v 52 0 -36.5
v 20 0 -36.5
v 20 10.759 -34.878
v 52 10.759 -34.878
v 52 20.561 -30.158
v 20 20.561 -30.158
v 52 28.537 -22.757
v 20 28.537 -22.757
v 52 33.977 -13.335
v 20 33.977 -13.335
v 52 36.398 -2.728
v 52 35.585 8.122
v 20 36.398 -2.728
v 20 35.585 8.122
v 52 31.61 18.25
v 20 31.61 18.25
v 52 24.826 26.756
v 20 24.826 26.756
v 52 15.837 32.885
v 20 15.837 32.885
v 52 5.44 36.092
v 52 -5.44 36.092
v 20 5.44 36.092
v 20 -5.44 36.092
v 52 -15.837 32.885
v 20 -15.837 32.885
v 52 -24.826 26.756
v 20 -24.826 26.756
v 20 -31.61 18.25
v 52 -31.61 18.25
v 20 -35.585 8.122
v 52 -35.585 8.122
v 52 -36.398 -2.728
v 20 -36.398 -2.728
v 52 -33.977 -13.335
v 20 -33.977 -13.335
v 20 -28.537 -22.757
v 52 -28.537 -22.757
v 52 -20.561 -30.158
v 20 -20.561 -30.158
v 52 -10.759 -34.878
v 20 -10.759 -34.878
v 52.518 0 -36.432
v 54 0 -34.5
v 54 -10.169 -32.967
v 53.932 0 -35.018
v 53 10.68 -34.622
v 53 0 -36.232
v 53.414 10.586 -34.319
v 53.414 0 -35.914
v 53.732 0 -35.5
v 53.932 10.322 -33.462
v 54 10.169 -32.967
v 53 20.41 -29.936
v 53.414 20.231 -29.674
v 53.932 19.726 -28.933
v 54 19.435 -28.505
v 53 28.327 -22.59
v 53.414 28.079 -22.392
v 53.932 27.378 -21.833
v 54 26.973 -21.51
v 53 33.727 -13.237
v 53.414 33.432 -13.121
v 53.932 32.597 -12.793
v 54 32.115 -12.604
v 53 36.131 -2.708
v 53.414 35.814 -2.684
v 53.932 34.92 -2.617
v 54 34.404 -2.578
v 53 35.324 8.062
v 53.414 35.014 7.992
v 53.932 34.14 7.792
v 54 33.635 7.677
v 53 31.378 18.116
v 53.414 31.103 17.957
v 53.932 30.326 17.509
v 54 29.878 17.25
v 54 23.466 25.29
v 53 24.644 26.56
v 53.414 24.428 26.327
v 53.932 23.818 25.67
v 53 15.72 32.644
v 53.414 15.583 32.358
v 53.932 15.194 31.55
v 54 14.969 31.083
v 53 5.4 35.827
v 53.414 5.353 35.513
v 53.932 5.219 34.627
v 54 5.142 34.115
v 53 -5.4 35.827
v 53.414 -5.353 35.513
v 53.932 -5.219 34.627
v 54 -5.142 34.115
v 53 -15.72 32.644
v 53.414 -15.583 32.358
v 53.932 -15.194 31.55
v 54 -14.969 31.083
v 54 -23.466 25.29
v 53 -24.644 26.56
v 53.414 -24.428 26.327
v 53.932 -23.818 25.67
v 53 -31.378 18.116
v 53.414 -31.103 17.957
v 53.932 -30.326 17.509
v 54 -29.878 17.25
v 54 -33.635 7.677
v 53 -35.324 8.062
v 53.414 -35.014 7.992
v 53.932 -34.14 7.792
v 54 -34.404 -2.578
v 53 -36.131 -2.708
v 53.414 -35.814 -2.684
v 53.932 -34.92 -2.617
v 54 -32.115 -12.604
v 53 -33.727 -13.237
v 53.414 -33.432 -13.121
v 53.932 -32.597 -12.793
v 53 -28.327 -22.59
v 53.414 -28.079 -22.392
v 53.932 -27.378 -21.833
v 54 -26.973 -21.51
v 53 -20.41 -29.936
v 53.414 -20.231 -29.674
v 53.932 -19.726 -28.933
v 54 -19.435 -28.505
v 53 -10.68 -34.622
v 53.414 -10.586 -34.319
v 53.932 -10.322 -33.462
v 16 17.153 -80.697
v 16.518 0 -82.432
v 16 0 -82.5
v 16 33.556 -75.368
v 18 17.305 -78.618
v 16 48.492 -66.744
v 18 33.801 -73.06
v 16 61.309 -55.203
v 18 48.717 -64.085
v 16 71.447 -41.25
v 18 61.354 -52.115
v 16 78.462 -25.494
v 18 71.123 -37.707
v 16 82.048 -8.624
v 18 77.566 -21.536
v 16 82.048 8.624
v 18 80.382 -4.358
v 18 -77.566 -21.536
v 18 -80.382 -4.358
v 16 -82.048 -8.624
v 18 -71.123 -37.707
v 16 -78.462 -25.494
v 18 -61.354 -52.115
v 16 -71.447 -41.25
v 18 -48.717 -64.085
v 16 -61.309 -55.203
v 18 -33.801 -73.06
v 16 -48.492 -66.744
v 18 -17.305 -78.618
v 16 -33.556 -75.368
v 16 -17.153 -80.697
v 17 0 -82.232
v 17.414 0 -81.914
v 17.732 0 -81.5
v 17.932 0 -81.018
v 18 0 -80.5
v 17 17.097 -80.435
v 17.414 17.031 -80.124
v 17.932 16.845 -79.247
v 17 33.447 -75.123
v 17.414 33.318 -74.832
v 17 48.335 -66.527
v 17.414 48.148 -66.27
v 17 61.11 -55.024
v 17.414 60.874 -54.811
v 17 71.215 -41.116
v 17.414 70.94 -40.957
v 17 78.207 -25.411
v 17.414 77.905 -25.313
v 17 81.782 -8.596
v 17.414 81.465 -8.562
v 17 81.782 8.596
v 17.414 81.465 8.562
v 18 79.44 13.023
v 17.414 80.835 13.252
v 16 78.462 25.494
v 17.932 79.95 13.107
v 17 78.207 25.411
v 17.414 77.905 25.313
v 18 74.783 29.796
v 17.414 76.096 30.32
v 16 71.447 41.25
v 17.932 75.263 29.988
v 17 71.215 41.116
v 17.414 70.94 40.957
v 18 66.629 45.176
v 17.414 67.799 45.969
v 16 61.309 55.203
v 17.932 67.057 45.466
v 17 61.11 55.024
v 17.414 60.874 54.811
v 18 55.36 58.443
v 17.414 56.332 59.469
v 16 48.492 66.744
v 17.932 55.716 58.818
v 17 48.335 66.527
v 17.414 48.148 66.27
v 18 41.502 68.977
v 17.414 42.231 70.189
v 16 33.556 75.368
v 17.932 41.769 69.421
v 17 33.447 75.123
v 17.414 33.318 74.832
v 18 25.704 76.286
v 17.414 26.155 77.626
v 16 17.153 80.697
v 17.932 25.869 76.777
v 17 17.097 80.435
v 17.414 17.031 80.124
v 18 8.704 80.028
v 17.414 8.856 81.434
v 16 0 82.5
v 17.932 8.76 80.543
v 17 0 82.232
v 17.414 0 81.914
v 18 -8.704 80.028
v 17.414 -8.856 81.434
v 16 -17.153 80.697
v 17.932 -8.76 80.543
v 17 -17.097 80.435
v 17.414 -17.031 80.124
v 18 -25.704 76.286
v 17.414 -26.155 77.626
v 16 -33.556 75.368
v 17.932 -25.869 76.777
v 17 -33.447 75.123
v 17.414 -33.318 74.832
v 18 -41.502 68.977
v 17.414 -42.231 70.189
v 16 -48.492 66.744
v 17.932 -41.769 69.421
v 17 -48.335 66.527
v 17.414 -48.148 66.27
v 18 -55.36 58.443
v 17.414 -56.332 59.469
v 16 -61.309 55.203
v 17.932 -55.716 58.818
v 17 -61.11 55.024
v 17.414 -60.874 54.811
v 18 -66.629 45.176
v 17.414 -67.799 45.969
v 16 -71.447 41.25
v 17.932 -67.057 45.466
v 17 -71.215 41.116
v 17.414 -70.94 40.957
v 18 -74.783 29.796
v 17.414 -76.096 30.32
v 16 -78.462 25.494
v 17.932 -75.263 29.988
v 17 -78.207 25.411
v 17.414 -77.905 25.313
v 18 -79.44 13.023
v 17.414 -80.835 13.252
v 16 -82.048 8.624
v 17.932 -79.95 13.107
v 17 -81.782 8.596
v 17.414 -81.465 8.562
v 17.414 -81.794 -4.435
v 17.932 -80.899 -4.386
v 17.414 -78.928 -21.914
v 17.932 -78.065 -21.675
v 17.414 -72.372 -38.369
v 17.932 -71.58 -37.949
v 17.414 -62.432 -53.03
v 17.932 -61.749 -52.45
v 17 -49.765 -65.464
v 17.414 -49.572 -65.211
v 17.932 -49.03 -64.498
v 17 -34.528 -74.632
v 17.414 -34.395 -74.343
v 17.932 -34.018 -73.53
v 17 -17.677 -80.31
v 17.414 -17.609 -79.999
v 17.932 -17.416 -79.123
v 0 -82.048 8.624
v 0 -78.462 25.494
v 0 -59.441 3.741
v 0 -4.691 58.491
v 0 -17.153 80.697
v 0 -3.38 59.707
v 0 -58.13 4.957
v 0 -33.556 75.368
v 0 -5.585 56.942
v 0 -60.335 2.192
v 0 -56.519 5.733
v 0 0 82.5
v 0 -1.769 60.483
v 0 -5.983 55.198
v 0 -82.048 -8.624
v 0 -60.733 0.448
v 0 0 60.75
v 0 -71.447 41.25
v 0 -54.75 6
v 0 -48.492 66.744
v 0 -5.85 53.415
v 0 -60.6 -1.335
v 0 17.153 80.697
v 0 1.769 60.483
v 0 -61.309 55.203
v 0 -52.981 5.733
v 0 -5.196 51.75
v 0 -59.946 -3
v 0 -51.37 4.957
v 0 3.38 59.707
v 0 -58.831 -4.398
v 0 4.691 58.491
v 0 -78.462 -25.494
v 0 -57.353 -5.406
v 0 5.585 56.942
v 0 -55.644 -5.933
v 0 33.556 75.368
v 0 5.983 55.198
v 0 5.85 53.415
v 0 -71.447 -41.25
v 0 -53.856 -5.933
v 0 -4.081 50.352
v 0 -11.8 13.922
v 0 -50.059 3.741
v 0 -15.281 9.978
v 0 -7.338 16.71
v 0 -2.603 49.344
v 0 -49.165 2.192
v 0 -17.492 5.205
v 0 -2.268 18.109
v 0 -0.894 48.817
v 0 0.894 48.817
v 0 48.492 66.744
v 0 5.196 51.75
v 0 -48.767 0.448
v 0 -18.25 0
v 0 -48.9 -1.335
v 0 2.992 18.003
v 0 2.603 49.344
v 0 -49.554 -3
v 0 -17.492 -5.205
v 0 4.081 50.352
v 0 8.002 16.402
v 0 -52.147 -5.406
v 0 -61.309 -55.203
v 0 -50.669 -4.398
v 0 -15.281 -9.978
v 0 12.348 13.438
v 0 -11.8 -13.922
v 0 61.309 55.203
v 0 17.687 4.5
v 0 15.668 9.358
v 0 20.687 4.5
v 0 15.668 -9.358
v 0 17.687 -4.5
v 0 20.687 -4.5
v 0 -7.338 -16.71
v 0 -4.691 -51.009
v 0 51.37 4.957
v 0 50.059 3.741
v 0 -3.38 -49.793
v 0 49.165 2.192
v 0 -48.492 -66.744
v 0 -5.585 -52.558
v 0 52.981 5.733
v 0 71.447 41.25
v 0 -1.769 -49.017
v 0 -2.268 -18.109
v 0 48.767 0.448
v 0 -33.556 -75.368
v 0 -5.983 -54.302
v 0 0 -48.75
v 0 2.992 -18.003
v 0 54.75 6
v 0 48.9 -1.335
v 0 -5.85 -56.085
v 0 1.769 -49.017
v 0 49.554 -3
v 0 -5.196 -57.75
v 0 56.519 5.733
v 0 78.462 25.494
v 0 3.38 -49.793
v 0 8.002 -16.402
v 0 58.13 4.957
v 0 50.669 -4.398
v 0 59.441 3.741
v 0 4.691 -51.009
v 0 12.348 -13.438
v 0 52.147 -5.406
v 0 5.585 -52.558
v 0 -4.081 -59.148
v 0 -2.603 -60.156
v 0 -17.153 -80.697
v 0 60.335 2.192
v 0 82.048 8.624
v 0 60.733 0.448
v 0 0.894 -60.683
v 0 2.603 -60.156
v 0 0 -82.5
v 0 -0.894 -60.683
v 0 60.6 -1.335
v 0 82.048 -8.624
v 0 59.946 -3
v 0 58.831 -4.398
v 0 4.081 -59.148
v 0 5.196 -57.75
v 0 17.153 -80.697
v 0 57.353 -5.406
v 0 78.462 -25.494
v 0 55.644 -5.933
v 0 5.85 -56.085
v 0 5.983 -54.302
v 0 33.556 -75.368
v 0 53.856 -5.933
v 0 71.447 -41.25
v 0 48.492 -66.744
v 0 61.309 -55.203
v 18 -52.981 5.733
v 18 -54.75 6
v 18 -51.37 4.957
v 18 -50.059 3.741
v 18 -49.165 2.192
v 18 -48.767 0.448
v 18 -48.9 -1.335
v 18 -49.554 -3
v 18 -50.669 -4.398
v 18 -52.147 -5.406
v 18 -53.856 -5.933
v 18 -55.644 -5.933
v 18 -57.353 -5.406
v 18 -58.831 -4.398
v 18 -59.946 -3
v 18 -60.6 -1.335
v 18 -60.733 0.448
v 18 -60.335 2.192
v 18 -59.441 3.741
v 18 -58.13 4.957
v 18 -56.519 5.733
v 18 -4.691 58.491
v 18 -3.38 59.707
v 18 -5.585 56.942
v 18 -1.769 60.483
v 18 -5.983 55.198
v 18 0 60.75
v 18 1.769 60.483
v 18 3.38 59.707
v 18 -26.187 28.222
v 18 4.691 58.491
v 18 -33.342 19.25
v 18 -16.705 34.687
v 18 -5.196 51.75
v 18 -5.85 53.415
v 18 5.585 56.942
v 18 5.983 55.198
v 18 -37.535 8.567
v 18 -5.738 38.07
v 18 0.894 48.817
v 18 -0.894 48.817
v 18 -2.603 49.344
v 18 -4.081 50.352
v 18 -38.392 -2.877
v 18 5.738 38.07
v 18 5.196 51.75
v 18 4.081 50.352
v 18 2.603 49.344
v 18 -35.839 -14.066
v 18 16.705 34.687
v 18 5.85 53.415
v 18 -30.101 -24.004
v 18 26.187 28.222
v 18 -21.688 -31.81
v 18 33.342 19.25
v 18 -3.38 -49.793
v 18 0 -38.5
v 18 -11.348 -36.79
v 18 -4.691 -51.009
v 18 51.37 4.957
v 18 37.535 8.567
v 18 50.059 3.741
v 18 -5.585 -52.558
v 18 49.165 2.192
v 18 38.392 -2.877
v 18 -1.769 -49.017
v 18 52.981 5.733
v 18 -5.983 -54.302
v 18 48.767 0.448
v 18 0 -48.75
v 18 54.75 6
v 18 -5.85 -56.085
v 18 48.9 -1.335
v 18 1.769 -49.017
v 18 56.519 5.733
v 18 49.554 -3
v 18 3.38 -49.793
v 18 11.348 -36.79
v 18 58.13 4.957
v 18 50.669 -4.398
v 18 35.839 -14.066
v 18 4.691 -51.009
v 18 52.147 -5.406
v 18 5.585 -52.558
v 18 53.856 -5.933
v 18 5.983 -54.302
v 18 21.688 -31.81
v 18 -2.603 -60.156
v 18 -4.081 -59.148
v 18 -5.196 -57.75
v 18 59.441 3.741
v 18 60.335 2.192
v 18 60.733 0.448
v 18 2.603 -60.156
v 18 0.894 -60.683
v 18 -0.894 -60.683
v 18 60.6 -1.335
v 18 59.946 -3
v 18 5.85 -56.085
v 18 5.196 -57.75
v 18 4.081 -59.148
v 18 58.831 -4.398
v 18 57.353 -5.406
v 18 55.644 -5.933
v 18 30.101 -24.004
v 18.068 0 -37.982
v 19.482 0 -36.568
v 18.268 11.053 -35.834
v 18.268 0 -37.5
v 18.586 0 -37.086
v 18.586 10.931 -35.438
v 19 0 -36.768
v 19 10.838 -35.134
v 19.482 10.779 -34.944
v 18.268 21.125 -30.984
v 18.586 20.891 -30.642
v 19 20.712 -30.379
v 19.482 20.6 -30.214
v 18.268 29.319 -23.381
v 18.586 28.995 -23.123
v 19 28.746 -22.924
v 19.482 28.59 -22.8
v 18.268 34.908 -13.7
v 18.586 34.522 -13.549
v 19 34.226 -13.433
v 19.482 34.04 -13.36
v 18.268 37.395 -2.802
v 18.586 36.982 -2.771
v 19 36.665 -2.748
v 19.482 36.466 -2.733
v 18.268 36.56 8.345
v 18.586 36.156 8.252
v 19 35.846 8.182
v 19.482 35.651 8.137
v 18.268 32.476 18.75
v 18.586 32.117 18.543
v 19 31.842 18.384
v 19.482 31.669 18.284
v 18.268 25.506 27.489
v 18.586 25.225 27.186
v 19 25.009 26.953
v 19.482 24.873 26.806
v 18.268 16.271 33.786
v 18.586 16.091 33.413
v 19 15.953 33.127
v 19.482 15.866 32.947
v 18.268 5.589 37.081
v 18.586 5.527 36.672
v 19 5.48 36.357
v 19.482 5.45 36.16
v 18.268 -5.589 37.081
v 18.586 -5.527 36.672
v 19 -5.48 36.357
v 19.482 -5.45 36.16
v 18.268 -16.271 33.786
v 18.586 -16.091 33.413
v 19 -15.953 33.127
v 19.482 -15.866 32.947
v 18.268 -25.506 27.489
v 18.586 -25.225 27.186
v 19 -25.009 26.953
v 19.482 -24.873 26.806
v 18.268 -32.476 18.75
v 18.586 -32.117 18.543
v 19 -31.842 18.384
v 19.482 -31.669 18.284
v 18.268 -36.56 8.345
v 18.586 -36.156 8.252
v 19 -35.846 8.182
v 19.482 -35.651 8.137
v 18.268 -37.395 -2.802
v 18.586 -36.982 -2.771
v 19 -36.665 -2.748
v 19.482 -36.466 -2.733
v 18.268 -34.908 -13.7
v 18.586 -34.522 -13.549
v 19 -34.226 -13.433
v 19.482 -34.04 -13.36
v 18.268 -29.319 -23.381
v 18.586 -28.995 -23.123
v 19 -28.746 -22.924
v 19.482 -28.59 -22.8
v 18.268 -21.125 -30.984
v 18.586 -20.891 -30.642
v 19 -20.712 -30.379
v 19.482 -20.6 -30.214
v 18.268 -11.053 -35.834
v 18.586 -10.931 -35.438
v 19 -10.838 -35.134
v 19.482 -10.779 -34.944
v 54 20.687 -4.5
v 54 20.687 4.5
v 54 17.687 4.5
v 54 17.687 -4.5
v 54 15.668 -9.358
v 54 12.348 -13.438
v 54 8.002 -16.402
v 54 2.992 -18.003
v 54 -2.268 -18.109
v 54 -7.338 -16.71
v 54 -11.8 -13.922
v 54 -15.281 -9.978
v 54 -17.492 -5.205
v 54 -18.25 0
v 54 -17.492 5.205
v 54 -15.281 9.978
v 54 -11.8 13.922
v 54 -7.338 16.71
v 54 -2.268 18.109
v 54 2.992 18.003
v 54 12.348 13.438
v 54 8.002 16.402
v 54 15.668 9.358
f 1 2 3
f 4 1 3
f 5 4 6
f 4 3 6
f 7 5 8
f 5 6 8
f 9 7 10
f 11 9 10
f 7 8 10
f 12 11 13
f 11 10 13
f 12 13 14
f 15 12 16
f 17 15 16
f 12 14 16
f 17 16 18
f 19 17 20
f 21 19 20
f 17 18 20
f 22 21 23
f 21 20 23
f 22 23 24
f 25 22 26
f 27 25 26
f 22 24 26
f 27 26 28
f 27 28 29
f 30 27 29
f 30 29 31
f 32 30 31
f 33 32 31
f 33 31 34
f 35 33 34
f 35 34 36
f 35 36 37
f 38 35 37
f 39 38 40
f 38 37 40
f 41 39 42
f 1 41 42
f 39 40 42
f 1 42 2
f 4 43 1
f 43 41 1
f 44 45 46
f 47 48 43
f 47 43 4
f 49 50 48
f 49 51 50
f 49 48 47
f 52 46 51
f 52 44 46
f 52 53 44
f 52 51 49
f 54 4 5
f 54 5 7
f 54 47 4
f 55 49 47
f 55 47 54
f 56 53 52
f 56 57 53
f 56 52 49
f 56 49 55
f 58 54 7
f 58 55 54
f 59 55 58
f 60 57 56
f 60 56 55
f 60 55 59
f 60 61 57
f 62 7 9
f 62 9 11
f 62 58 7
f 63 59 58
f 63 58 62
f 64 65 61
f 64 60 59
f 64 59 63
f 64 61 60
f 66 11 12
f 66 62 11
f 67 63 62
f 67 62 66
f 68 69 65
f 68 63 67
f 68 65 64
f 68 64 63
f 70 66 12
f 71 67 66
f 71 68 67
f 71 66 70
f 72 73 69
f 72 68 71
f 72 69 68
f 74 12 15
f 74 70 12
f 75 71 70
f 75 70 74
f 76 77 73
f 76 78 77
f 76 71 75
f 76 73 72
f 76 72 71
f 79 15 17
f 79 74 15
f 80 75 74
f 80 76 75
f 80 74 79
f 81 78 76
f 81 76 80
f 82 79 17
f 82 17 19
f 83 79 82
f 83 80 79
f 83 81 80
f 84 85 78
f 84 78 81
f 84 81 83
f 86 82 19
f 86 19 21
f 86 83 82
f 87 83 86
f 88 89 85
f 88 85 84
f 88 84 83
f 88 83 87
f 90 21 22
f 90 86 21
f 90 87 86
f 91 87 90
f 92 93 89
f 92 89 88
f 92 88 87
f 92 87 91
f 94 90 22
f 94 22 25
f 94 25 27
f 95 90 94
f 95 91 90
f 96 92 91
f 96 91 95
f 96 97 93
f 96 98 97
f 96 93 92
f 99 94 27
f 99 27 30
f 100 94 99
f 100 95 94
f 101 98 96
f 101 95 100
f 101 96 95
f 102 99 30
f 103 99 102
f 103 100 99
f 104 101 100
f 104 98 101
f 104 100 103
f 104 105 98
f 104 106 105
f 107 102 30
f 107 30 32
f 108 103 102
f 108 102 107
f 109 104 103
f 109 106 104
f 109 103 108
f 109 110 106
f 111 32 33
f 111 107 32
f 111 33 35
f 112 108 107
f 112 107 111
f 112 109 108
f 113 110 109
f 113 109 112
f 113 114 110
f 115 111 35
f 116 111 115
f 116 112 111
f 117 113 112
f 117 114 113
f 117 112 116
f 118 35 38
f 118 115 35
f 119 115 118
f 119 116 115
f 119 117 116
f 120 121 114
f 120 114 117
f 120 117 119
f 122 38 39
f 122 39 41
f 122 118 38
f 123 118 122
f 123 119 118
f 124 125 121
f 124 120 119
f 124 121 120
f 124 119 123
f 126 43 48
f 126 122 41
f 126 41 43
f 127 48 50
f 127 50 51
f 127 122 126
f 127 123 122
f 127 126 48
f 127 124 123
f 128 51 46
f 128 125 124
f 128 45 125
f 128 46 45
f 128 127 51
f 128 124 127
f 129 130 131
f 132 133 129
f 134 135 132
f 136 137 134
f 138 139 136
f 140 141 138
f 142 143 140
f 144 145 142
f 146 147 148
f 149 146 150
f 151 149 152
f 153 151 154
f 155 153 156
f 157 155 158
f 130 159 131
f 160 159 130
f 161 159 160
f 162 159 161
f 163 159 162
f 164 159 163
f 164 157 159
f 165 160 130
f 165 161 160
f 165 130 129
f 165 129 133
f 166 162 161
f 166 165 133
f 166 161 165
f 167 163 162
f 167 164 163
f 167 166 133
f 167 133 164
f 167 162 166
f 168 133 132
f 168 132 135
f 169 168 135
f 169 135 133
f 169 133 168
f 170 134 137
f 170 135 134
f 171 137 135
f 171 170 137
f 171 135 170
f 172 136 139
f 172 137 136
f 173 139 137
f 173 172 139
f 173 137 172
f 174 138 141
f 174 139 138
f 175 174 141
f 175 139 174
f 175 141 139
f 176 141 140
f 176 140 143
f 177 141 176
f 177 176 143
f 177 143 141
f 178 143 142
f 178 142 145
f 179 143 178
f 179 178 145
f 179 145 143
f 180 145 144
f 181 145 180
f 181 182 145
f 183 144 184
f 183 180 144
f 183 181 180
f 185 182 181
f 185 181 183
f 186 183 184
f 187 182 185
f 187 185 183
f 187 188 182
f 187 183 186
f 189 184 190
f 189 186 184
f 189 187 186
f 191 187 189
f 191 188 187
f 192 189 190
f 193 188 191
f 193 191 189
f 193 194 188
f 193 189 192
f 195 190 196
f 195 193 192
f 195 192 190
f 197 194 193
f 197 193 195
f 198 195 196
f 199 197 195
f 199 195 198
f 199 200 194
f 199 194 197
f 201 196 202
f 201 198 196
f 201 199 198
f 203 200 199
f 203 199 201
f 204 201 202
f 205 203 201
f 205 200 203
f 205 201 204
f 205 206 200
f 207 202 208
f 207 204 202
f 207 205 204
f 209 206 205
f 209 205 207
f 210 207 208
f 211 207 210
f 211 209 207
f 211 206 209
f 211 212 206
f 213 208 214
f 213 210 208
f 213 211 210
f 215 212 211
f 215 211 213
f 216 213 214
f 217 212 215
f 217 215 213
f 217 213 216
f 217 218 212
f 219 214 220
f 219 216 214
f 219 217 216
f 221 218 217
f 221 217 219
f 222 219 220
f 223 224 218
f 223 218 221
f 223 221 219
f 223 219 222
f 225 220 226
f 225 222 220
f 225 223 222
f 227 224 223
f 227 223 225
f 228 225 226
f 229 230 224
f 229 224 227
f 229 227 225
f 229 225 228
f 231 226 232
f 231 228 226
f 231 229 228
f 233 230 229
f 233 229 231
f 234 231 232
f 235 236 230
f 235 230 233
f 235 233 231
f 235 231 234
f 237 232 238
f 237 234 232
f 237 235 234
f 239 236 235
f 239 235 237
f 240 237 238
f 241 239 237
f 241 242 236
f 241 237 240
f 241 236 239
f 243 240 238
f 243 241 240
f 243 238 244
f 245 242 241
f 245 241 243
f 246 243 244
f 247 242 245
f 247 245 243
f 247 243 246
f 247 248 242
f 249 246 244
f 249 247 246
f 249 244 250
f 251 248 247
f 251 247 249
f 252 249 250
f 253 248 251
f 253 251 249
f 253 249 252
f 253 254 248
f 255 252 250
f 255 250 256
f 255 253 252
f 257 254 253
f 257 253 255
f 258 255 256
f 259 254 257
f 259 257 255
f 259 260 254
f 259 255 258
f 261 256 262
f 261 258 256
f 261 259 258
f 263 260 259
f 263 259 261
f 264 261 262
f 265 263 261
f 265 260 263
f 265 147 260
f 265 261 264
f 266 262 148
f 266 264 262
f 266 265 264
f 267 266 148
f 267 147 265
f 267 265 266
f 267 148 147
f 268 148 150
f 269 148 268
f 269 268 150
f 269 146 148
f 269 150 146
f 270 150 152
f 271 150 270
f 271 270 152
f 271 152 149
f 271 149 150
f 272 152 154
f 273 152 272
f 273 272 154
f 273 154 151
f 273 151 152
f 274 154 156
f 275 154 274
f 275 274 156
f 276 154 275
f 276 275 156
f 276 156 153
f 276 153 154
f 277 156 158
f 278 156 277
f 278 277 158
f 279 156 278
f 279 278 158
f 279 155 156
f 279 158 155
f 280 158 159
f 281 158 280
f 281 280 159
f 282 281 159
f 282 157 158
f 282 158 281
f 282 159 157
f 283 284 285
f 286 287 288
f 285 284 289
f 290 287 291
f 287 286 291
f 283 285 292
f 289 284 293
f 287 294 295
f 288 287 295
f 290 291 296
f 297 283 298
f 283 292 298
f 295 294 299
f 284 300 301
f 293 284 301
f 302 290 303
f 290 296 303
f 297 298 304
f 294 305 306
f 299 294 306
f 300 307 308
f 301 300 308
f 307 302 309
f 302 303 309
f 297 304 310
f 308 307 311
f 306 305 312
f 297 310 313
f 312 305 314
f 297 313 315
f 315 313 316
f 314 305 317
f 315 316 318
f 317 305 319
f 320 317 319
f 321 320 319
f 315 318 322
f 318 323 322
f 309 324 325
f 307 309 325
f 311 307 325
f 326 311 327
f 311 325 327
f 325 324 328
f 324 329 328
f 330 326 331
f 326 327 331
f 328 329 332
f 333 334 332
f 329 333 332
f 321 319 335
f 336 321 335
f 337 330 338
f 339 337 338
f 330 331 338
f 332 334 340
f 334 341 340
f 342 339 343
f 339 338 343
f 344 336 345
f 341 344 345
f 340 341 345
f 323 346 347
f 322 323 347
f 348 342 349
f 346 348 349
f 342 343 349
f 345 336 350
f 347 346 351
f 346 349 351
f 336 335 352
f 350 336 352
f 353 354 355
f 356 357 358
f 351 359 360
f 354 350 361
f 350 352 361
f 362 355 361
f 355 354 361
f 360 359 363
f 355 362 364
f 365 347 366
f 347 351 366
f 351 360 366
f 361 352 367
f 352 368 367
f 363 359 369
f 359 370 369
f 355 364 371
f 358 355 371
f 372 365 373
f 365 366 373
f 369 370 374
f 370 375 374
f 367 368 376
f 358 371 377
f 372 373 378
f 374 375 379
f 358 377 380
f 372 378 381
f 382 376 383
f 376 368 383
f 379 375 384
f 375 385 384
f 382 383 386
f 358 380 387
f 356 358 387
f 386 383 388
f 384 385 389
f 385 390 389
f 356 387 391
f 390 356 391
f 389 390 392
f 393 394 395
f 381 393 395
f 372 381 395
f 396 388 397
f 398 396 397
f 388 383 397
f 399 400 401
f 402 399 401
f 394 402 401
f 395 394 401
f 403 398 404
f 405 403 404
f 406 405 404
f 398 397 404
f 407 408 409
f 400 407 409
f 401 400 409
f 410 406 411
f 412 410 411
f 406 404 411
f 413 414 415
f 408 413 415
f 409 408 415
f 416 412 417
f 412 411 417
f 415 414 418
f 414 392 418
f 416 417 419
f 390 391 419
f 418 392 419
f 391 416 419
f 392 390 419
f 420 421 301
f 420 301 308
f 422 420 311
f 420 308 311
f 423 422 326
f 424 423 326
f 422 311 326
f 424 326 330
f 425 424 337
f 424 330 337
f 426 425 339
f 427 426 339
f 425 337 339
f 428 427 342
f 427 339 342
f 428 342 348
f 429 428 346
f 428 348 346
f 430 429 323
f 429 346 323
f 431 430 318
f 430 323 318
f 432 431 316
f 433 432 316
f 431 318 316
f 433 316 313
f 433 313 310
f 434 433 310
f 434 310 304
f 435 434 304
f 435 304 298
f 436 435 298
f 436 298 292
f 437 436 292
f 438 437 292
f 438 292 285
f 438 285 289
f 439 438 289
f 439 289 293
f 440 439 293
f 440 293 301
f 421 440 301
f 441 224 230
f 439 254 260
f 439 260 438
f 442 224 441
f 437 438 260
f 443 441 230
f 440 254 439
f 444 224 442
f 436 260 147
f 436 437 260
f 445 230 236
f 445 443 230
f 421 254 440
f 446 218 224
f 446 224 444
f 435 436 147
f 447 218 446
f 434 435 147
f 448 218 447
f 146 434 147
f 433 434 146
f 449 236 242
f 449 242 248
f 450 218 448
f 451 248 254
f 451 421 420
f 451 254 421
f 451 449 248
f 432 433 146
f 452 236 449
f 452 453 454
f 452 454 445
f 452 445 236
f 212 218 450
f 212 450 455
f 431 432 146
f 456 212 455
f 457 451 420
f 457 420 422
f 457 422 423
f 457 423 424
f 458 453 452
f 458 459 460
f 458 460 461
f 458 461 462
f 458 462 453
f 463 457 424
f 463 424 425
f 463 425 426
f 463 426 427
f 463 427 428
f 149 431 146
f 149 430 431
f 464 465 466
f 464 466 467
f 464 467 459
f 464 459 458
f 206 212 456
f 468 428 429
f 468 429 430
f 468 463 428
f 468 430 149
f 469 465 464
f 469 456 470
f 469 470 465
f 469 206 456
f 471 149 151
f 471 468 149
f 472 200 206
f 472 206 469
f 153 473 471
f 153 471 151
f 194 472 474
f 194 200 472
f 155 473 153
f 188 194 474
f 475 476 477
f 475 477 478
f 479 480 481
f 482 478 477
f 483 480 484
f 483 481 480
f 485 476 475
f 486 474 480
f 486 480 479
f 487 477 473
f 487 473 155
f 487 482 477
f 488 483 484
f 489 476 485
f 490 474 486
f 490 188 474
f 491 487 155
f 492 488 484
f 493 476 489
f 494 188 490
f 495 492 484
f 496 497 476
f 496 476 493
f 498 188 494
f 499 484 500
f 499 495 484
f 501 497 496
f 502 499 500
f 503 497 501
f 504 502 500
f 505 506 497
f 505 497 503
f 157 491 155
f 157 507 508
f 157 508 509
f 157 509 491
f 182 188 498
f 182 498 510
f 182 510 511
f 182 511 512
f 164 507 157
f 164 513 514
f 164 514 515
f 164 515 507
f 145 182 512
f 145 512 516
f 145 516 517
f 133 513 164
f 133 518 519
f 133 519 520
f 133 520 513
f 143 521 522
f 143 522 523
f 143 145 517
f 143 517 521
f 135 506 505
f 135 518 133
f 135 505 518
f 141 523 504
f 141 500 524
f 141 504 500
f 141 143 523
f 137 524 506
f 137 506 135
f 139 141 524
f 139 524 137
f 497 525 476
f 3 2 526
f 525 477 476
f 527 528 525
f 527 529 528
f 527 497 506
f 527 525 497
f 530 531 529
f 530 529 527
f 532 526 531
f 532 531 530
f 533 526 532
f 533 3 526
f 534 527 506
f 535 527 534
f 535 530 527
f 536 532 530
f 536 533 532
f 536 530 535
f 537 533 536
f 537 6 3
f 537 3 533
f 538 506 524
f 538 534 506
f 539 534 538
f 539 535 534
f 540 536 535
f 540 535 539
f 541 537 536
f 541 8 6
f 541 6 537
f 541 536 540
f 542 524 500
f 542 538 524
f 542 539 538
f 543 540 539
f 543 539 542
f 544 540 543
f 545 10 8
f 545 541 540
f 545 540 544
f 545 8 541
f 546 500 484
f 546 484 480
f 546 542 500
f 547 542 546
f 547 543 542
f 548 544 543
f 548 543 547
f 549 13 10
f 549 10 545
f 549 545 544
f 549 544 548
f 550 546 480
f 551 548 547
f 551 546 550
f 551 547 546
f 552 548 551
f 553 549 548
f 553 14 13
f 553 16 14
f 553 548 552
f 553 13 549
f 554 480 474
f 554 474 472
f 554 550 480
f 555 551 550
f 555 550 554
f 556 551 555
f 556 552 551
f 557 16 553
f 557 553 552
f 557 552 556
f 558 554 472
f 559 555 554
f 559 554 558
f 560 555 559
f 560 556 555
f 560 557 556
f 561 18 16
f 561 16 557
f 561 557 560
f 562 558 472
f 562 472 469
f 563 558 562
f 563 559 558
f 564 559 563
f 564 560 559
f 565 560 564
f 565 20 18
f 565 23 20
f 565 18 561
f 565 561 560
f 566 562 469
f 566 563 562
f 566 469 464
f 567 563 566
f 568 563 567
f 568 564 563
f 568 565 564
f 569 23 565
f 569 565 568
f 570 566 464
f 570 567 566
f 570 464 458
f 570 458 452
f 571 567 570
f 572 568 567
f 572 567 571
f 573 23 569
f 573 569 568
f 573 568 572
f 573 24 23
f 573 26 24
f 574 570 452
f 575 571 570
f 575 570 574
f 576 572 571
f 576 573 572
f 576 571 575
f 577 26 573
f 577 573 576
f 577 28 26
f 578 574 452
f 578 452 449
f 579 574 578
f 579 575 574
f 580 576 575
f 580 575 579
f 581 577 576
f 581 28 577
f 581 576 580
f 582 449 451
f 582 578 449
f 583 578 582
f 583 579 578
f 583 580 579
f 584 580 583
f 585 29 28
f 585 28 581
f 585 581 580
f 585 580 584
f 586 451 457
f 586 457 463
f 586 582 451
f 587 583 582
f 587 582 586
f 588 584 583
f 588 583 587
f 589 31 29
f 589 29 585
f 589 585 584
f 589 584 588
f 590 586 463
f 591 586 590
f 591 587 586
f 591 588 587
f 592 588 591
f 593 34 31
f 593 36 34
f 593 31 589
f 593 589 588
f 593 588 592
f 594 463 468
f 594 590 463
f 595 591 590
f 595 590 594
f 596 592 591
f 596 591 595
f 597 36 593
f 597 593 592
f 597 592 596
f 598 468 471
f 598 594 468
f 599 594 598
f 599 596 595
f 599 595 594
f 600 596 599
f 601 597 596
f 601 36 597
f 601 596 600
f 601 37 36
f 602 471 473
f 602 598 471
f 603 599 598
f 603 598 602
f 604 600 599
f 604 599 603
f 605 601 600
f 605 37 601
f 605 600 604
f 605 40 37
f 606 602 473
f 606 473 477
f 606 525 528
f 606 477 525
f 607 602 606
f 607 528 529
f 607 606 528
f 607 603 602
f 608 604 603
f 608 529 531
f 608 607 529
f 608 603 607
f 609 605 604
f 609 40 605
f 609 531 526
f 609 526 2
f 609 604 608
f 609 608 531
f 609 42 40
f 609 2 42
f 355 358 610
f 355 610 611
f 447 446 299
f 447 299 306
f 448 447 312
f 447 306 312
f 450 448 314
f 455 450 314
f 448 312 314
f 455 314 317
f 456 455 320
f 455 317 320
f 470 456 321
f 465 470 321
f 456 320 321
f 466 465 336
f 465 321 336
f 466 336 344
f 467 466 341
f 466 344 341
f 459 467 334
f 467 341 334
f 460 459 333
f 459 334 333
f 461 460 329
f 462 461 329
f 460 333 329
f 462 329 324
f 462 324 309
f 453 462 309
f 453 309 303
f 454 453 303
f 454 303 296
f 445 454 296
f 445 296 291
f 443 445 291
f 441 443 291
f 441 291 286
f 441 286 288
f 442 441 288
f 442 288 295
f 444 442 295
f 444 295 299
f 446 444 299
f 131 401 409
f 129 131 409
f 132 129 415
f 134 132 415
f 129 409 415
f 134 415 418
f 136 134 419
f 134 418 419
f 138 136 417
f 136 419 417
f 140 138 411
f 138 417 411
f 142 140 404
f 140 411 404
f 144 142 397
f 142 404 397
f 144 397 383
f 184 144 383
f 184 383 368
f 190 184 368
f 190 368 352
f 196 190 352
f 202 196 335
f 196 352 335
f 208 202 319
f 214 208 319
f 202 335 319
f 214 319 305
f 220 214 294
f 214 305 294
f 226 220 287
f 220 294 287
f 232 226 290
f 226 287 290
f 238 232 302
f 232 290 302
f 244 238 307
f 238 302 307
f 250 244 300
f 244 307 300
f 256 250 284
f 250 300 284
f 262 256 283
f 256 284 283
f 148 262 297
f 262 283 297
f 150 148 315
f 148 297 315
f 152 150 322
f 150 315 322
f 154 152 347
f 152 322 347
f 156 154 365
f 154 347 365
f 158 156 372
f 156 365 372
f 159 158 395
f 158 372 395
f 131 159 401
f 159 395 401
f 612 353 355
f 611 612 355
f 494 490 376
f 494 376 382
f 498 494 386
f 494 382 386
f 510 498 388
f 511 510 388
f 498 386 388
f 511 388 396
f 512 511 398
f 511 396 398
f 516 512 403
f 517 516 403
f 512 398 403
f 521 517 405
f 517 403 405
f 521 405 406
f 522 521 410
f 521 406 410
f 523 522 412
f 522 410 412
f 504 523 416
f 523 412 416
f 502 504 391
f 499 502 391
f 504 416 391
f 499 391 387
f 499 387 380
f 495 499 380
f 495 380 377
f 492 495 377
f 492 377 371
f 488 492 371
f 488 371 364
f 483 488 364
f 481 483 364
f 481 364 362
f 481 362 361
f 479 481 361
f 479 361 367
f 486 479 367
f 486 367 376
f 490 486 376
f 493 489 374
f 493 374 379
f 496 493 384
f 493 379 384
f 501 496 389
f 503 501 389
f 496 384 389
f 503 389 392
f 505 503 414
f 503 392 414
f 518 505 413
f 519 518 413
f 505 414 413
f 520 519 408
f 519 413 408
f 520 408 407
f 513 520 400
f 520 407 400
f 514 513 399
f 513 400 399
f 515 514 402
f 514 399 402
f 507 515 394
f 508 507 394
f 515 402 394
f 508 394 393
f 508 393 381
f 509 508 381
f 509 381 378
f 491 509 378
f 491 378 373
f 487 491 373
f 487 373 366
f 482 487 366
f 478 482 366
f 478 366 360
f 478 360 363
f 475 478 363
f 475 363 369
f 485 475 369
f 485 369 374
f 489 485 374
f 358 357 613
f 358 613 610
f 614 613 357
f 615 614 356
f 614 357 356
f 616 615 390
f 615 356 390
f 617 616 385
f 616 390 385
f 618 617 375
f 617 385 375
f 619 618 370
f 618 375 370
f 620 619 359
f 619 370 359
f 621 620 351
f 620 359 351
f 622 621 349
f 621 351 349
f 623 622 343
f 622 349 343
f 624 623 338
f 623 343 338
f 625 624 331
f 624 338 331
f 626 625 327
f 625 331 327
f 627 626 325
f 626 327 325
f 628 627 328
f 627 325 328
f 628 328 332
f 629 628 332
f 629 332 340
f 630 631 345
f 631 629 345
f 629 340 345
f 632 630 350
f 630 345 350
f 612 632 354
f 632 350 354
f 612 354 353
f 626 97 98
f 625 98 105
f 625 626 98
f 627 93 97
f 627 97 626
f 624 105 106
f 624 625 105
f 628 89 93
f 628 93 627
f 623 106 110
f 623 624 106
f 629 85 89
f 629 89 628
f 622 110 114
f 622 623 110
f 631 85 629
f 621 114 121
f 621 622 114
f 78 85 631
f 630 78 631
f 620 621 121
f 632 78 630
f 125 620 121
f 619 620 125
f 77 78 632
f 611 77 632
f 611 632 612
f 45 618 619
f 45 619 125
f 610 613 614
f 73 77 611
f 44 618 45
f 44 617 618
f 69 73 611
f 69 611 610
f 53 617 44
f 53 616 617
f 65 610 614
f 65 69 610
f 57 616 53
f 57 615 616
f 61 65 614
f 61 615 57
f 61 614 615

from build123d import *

# Parameters (mm, degrees)
SKETCH1_R           = 82.5
BOSS_EXTRUDE1_DEPTH = 18
SKETCH2_R           = 36.5
BOSS_EXTRUDE2_DEPTH = 36
SKETCH3_R           = 18.25
CUT_EXTRUDE1_DEPTH  = 129.563214023
SKETCH4_R           = 6
CUT_EXTRUDE2_DEPTH  = 129.563214023
FILLET1_R           = 2
SKETCH5_W           = 9
SKETCH5_H           = 3
CUT_EXTRUDE3_DEPTH  = 129.563214023


with BuildPart() as part:
    # Sketch1 → Boss-Extrude1 (new body)
    with BuildSketch(Plane(origin=(0, 0, 0), x_dir=(0, 0, -1), z_dir=(1, 0, 0))):
        Circle(SKETCH1_R)
    extrude(amount=BOSS_EXTRUDE1_DEPTH)

    # Sketch2 → Boss-Extrude2 (add)
    with BuildSketch(Plane(origin=(18, 0, 0), x_dir=(0, 0, -1), z_dir=(1, 0, 0))):
        Circle(SKETCH2_R)
    extrude(amount=BOSS_EXTRUDE2_DEPTH)

    # Sketch3 → Cut-Extrude1 (cut, through all)
    with BuildSketch(Plane.ZY):
        Circle(SKETCH3_R)
    extrude(amount=-CUT_EXTRUDE1_DEPTH, mode=Mode.SUBTRACT)

    # Sketch4 → Cut-Extrude2 (cut, through all)
    with BuildSketch(Plane.ZY):
        with Locations((0, -54.75)):
            Circle(SKETCH4_R)
        with Locations((-54.75, 0)):
            Circle(SKETCH4_R)
        with Locations((0, 54.75)):
            Circle(SKETCH4_R)
        with Locations((54.75, 0)):
            Circle(SKETCH4_R)
    extrude(amount=-CUT_EXTRUDE2_DEPTH, mode=Mode.SUBTRACT)

    # Fillet1
    fillet1_edges = [part.edges().sort_by_distance(p)[0] for p in [
        (18, 0, 82.5),
        (18, 0, 36.5),
        (54, 0, 36.5),
    ]]
    fillet(fillet1_edges, radius=FILLET1_R)

    # Sketch5 → Cut-Extrude3 (cut, through all)
    with BuildSketch(Plane.ZY):
        with Locations((0, 19.186506156)):
            Rectangle(SKETCH5_W, SKETCH5_H)
    extrude(amount=-CUT_EXTRUDE3_DEPTH, mode=Mode.SUBTRACT)


solid = part.part
